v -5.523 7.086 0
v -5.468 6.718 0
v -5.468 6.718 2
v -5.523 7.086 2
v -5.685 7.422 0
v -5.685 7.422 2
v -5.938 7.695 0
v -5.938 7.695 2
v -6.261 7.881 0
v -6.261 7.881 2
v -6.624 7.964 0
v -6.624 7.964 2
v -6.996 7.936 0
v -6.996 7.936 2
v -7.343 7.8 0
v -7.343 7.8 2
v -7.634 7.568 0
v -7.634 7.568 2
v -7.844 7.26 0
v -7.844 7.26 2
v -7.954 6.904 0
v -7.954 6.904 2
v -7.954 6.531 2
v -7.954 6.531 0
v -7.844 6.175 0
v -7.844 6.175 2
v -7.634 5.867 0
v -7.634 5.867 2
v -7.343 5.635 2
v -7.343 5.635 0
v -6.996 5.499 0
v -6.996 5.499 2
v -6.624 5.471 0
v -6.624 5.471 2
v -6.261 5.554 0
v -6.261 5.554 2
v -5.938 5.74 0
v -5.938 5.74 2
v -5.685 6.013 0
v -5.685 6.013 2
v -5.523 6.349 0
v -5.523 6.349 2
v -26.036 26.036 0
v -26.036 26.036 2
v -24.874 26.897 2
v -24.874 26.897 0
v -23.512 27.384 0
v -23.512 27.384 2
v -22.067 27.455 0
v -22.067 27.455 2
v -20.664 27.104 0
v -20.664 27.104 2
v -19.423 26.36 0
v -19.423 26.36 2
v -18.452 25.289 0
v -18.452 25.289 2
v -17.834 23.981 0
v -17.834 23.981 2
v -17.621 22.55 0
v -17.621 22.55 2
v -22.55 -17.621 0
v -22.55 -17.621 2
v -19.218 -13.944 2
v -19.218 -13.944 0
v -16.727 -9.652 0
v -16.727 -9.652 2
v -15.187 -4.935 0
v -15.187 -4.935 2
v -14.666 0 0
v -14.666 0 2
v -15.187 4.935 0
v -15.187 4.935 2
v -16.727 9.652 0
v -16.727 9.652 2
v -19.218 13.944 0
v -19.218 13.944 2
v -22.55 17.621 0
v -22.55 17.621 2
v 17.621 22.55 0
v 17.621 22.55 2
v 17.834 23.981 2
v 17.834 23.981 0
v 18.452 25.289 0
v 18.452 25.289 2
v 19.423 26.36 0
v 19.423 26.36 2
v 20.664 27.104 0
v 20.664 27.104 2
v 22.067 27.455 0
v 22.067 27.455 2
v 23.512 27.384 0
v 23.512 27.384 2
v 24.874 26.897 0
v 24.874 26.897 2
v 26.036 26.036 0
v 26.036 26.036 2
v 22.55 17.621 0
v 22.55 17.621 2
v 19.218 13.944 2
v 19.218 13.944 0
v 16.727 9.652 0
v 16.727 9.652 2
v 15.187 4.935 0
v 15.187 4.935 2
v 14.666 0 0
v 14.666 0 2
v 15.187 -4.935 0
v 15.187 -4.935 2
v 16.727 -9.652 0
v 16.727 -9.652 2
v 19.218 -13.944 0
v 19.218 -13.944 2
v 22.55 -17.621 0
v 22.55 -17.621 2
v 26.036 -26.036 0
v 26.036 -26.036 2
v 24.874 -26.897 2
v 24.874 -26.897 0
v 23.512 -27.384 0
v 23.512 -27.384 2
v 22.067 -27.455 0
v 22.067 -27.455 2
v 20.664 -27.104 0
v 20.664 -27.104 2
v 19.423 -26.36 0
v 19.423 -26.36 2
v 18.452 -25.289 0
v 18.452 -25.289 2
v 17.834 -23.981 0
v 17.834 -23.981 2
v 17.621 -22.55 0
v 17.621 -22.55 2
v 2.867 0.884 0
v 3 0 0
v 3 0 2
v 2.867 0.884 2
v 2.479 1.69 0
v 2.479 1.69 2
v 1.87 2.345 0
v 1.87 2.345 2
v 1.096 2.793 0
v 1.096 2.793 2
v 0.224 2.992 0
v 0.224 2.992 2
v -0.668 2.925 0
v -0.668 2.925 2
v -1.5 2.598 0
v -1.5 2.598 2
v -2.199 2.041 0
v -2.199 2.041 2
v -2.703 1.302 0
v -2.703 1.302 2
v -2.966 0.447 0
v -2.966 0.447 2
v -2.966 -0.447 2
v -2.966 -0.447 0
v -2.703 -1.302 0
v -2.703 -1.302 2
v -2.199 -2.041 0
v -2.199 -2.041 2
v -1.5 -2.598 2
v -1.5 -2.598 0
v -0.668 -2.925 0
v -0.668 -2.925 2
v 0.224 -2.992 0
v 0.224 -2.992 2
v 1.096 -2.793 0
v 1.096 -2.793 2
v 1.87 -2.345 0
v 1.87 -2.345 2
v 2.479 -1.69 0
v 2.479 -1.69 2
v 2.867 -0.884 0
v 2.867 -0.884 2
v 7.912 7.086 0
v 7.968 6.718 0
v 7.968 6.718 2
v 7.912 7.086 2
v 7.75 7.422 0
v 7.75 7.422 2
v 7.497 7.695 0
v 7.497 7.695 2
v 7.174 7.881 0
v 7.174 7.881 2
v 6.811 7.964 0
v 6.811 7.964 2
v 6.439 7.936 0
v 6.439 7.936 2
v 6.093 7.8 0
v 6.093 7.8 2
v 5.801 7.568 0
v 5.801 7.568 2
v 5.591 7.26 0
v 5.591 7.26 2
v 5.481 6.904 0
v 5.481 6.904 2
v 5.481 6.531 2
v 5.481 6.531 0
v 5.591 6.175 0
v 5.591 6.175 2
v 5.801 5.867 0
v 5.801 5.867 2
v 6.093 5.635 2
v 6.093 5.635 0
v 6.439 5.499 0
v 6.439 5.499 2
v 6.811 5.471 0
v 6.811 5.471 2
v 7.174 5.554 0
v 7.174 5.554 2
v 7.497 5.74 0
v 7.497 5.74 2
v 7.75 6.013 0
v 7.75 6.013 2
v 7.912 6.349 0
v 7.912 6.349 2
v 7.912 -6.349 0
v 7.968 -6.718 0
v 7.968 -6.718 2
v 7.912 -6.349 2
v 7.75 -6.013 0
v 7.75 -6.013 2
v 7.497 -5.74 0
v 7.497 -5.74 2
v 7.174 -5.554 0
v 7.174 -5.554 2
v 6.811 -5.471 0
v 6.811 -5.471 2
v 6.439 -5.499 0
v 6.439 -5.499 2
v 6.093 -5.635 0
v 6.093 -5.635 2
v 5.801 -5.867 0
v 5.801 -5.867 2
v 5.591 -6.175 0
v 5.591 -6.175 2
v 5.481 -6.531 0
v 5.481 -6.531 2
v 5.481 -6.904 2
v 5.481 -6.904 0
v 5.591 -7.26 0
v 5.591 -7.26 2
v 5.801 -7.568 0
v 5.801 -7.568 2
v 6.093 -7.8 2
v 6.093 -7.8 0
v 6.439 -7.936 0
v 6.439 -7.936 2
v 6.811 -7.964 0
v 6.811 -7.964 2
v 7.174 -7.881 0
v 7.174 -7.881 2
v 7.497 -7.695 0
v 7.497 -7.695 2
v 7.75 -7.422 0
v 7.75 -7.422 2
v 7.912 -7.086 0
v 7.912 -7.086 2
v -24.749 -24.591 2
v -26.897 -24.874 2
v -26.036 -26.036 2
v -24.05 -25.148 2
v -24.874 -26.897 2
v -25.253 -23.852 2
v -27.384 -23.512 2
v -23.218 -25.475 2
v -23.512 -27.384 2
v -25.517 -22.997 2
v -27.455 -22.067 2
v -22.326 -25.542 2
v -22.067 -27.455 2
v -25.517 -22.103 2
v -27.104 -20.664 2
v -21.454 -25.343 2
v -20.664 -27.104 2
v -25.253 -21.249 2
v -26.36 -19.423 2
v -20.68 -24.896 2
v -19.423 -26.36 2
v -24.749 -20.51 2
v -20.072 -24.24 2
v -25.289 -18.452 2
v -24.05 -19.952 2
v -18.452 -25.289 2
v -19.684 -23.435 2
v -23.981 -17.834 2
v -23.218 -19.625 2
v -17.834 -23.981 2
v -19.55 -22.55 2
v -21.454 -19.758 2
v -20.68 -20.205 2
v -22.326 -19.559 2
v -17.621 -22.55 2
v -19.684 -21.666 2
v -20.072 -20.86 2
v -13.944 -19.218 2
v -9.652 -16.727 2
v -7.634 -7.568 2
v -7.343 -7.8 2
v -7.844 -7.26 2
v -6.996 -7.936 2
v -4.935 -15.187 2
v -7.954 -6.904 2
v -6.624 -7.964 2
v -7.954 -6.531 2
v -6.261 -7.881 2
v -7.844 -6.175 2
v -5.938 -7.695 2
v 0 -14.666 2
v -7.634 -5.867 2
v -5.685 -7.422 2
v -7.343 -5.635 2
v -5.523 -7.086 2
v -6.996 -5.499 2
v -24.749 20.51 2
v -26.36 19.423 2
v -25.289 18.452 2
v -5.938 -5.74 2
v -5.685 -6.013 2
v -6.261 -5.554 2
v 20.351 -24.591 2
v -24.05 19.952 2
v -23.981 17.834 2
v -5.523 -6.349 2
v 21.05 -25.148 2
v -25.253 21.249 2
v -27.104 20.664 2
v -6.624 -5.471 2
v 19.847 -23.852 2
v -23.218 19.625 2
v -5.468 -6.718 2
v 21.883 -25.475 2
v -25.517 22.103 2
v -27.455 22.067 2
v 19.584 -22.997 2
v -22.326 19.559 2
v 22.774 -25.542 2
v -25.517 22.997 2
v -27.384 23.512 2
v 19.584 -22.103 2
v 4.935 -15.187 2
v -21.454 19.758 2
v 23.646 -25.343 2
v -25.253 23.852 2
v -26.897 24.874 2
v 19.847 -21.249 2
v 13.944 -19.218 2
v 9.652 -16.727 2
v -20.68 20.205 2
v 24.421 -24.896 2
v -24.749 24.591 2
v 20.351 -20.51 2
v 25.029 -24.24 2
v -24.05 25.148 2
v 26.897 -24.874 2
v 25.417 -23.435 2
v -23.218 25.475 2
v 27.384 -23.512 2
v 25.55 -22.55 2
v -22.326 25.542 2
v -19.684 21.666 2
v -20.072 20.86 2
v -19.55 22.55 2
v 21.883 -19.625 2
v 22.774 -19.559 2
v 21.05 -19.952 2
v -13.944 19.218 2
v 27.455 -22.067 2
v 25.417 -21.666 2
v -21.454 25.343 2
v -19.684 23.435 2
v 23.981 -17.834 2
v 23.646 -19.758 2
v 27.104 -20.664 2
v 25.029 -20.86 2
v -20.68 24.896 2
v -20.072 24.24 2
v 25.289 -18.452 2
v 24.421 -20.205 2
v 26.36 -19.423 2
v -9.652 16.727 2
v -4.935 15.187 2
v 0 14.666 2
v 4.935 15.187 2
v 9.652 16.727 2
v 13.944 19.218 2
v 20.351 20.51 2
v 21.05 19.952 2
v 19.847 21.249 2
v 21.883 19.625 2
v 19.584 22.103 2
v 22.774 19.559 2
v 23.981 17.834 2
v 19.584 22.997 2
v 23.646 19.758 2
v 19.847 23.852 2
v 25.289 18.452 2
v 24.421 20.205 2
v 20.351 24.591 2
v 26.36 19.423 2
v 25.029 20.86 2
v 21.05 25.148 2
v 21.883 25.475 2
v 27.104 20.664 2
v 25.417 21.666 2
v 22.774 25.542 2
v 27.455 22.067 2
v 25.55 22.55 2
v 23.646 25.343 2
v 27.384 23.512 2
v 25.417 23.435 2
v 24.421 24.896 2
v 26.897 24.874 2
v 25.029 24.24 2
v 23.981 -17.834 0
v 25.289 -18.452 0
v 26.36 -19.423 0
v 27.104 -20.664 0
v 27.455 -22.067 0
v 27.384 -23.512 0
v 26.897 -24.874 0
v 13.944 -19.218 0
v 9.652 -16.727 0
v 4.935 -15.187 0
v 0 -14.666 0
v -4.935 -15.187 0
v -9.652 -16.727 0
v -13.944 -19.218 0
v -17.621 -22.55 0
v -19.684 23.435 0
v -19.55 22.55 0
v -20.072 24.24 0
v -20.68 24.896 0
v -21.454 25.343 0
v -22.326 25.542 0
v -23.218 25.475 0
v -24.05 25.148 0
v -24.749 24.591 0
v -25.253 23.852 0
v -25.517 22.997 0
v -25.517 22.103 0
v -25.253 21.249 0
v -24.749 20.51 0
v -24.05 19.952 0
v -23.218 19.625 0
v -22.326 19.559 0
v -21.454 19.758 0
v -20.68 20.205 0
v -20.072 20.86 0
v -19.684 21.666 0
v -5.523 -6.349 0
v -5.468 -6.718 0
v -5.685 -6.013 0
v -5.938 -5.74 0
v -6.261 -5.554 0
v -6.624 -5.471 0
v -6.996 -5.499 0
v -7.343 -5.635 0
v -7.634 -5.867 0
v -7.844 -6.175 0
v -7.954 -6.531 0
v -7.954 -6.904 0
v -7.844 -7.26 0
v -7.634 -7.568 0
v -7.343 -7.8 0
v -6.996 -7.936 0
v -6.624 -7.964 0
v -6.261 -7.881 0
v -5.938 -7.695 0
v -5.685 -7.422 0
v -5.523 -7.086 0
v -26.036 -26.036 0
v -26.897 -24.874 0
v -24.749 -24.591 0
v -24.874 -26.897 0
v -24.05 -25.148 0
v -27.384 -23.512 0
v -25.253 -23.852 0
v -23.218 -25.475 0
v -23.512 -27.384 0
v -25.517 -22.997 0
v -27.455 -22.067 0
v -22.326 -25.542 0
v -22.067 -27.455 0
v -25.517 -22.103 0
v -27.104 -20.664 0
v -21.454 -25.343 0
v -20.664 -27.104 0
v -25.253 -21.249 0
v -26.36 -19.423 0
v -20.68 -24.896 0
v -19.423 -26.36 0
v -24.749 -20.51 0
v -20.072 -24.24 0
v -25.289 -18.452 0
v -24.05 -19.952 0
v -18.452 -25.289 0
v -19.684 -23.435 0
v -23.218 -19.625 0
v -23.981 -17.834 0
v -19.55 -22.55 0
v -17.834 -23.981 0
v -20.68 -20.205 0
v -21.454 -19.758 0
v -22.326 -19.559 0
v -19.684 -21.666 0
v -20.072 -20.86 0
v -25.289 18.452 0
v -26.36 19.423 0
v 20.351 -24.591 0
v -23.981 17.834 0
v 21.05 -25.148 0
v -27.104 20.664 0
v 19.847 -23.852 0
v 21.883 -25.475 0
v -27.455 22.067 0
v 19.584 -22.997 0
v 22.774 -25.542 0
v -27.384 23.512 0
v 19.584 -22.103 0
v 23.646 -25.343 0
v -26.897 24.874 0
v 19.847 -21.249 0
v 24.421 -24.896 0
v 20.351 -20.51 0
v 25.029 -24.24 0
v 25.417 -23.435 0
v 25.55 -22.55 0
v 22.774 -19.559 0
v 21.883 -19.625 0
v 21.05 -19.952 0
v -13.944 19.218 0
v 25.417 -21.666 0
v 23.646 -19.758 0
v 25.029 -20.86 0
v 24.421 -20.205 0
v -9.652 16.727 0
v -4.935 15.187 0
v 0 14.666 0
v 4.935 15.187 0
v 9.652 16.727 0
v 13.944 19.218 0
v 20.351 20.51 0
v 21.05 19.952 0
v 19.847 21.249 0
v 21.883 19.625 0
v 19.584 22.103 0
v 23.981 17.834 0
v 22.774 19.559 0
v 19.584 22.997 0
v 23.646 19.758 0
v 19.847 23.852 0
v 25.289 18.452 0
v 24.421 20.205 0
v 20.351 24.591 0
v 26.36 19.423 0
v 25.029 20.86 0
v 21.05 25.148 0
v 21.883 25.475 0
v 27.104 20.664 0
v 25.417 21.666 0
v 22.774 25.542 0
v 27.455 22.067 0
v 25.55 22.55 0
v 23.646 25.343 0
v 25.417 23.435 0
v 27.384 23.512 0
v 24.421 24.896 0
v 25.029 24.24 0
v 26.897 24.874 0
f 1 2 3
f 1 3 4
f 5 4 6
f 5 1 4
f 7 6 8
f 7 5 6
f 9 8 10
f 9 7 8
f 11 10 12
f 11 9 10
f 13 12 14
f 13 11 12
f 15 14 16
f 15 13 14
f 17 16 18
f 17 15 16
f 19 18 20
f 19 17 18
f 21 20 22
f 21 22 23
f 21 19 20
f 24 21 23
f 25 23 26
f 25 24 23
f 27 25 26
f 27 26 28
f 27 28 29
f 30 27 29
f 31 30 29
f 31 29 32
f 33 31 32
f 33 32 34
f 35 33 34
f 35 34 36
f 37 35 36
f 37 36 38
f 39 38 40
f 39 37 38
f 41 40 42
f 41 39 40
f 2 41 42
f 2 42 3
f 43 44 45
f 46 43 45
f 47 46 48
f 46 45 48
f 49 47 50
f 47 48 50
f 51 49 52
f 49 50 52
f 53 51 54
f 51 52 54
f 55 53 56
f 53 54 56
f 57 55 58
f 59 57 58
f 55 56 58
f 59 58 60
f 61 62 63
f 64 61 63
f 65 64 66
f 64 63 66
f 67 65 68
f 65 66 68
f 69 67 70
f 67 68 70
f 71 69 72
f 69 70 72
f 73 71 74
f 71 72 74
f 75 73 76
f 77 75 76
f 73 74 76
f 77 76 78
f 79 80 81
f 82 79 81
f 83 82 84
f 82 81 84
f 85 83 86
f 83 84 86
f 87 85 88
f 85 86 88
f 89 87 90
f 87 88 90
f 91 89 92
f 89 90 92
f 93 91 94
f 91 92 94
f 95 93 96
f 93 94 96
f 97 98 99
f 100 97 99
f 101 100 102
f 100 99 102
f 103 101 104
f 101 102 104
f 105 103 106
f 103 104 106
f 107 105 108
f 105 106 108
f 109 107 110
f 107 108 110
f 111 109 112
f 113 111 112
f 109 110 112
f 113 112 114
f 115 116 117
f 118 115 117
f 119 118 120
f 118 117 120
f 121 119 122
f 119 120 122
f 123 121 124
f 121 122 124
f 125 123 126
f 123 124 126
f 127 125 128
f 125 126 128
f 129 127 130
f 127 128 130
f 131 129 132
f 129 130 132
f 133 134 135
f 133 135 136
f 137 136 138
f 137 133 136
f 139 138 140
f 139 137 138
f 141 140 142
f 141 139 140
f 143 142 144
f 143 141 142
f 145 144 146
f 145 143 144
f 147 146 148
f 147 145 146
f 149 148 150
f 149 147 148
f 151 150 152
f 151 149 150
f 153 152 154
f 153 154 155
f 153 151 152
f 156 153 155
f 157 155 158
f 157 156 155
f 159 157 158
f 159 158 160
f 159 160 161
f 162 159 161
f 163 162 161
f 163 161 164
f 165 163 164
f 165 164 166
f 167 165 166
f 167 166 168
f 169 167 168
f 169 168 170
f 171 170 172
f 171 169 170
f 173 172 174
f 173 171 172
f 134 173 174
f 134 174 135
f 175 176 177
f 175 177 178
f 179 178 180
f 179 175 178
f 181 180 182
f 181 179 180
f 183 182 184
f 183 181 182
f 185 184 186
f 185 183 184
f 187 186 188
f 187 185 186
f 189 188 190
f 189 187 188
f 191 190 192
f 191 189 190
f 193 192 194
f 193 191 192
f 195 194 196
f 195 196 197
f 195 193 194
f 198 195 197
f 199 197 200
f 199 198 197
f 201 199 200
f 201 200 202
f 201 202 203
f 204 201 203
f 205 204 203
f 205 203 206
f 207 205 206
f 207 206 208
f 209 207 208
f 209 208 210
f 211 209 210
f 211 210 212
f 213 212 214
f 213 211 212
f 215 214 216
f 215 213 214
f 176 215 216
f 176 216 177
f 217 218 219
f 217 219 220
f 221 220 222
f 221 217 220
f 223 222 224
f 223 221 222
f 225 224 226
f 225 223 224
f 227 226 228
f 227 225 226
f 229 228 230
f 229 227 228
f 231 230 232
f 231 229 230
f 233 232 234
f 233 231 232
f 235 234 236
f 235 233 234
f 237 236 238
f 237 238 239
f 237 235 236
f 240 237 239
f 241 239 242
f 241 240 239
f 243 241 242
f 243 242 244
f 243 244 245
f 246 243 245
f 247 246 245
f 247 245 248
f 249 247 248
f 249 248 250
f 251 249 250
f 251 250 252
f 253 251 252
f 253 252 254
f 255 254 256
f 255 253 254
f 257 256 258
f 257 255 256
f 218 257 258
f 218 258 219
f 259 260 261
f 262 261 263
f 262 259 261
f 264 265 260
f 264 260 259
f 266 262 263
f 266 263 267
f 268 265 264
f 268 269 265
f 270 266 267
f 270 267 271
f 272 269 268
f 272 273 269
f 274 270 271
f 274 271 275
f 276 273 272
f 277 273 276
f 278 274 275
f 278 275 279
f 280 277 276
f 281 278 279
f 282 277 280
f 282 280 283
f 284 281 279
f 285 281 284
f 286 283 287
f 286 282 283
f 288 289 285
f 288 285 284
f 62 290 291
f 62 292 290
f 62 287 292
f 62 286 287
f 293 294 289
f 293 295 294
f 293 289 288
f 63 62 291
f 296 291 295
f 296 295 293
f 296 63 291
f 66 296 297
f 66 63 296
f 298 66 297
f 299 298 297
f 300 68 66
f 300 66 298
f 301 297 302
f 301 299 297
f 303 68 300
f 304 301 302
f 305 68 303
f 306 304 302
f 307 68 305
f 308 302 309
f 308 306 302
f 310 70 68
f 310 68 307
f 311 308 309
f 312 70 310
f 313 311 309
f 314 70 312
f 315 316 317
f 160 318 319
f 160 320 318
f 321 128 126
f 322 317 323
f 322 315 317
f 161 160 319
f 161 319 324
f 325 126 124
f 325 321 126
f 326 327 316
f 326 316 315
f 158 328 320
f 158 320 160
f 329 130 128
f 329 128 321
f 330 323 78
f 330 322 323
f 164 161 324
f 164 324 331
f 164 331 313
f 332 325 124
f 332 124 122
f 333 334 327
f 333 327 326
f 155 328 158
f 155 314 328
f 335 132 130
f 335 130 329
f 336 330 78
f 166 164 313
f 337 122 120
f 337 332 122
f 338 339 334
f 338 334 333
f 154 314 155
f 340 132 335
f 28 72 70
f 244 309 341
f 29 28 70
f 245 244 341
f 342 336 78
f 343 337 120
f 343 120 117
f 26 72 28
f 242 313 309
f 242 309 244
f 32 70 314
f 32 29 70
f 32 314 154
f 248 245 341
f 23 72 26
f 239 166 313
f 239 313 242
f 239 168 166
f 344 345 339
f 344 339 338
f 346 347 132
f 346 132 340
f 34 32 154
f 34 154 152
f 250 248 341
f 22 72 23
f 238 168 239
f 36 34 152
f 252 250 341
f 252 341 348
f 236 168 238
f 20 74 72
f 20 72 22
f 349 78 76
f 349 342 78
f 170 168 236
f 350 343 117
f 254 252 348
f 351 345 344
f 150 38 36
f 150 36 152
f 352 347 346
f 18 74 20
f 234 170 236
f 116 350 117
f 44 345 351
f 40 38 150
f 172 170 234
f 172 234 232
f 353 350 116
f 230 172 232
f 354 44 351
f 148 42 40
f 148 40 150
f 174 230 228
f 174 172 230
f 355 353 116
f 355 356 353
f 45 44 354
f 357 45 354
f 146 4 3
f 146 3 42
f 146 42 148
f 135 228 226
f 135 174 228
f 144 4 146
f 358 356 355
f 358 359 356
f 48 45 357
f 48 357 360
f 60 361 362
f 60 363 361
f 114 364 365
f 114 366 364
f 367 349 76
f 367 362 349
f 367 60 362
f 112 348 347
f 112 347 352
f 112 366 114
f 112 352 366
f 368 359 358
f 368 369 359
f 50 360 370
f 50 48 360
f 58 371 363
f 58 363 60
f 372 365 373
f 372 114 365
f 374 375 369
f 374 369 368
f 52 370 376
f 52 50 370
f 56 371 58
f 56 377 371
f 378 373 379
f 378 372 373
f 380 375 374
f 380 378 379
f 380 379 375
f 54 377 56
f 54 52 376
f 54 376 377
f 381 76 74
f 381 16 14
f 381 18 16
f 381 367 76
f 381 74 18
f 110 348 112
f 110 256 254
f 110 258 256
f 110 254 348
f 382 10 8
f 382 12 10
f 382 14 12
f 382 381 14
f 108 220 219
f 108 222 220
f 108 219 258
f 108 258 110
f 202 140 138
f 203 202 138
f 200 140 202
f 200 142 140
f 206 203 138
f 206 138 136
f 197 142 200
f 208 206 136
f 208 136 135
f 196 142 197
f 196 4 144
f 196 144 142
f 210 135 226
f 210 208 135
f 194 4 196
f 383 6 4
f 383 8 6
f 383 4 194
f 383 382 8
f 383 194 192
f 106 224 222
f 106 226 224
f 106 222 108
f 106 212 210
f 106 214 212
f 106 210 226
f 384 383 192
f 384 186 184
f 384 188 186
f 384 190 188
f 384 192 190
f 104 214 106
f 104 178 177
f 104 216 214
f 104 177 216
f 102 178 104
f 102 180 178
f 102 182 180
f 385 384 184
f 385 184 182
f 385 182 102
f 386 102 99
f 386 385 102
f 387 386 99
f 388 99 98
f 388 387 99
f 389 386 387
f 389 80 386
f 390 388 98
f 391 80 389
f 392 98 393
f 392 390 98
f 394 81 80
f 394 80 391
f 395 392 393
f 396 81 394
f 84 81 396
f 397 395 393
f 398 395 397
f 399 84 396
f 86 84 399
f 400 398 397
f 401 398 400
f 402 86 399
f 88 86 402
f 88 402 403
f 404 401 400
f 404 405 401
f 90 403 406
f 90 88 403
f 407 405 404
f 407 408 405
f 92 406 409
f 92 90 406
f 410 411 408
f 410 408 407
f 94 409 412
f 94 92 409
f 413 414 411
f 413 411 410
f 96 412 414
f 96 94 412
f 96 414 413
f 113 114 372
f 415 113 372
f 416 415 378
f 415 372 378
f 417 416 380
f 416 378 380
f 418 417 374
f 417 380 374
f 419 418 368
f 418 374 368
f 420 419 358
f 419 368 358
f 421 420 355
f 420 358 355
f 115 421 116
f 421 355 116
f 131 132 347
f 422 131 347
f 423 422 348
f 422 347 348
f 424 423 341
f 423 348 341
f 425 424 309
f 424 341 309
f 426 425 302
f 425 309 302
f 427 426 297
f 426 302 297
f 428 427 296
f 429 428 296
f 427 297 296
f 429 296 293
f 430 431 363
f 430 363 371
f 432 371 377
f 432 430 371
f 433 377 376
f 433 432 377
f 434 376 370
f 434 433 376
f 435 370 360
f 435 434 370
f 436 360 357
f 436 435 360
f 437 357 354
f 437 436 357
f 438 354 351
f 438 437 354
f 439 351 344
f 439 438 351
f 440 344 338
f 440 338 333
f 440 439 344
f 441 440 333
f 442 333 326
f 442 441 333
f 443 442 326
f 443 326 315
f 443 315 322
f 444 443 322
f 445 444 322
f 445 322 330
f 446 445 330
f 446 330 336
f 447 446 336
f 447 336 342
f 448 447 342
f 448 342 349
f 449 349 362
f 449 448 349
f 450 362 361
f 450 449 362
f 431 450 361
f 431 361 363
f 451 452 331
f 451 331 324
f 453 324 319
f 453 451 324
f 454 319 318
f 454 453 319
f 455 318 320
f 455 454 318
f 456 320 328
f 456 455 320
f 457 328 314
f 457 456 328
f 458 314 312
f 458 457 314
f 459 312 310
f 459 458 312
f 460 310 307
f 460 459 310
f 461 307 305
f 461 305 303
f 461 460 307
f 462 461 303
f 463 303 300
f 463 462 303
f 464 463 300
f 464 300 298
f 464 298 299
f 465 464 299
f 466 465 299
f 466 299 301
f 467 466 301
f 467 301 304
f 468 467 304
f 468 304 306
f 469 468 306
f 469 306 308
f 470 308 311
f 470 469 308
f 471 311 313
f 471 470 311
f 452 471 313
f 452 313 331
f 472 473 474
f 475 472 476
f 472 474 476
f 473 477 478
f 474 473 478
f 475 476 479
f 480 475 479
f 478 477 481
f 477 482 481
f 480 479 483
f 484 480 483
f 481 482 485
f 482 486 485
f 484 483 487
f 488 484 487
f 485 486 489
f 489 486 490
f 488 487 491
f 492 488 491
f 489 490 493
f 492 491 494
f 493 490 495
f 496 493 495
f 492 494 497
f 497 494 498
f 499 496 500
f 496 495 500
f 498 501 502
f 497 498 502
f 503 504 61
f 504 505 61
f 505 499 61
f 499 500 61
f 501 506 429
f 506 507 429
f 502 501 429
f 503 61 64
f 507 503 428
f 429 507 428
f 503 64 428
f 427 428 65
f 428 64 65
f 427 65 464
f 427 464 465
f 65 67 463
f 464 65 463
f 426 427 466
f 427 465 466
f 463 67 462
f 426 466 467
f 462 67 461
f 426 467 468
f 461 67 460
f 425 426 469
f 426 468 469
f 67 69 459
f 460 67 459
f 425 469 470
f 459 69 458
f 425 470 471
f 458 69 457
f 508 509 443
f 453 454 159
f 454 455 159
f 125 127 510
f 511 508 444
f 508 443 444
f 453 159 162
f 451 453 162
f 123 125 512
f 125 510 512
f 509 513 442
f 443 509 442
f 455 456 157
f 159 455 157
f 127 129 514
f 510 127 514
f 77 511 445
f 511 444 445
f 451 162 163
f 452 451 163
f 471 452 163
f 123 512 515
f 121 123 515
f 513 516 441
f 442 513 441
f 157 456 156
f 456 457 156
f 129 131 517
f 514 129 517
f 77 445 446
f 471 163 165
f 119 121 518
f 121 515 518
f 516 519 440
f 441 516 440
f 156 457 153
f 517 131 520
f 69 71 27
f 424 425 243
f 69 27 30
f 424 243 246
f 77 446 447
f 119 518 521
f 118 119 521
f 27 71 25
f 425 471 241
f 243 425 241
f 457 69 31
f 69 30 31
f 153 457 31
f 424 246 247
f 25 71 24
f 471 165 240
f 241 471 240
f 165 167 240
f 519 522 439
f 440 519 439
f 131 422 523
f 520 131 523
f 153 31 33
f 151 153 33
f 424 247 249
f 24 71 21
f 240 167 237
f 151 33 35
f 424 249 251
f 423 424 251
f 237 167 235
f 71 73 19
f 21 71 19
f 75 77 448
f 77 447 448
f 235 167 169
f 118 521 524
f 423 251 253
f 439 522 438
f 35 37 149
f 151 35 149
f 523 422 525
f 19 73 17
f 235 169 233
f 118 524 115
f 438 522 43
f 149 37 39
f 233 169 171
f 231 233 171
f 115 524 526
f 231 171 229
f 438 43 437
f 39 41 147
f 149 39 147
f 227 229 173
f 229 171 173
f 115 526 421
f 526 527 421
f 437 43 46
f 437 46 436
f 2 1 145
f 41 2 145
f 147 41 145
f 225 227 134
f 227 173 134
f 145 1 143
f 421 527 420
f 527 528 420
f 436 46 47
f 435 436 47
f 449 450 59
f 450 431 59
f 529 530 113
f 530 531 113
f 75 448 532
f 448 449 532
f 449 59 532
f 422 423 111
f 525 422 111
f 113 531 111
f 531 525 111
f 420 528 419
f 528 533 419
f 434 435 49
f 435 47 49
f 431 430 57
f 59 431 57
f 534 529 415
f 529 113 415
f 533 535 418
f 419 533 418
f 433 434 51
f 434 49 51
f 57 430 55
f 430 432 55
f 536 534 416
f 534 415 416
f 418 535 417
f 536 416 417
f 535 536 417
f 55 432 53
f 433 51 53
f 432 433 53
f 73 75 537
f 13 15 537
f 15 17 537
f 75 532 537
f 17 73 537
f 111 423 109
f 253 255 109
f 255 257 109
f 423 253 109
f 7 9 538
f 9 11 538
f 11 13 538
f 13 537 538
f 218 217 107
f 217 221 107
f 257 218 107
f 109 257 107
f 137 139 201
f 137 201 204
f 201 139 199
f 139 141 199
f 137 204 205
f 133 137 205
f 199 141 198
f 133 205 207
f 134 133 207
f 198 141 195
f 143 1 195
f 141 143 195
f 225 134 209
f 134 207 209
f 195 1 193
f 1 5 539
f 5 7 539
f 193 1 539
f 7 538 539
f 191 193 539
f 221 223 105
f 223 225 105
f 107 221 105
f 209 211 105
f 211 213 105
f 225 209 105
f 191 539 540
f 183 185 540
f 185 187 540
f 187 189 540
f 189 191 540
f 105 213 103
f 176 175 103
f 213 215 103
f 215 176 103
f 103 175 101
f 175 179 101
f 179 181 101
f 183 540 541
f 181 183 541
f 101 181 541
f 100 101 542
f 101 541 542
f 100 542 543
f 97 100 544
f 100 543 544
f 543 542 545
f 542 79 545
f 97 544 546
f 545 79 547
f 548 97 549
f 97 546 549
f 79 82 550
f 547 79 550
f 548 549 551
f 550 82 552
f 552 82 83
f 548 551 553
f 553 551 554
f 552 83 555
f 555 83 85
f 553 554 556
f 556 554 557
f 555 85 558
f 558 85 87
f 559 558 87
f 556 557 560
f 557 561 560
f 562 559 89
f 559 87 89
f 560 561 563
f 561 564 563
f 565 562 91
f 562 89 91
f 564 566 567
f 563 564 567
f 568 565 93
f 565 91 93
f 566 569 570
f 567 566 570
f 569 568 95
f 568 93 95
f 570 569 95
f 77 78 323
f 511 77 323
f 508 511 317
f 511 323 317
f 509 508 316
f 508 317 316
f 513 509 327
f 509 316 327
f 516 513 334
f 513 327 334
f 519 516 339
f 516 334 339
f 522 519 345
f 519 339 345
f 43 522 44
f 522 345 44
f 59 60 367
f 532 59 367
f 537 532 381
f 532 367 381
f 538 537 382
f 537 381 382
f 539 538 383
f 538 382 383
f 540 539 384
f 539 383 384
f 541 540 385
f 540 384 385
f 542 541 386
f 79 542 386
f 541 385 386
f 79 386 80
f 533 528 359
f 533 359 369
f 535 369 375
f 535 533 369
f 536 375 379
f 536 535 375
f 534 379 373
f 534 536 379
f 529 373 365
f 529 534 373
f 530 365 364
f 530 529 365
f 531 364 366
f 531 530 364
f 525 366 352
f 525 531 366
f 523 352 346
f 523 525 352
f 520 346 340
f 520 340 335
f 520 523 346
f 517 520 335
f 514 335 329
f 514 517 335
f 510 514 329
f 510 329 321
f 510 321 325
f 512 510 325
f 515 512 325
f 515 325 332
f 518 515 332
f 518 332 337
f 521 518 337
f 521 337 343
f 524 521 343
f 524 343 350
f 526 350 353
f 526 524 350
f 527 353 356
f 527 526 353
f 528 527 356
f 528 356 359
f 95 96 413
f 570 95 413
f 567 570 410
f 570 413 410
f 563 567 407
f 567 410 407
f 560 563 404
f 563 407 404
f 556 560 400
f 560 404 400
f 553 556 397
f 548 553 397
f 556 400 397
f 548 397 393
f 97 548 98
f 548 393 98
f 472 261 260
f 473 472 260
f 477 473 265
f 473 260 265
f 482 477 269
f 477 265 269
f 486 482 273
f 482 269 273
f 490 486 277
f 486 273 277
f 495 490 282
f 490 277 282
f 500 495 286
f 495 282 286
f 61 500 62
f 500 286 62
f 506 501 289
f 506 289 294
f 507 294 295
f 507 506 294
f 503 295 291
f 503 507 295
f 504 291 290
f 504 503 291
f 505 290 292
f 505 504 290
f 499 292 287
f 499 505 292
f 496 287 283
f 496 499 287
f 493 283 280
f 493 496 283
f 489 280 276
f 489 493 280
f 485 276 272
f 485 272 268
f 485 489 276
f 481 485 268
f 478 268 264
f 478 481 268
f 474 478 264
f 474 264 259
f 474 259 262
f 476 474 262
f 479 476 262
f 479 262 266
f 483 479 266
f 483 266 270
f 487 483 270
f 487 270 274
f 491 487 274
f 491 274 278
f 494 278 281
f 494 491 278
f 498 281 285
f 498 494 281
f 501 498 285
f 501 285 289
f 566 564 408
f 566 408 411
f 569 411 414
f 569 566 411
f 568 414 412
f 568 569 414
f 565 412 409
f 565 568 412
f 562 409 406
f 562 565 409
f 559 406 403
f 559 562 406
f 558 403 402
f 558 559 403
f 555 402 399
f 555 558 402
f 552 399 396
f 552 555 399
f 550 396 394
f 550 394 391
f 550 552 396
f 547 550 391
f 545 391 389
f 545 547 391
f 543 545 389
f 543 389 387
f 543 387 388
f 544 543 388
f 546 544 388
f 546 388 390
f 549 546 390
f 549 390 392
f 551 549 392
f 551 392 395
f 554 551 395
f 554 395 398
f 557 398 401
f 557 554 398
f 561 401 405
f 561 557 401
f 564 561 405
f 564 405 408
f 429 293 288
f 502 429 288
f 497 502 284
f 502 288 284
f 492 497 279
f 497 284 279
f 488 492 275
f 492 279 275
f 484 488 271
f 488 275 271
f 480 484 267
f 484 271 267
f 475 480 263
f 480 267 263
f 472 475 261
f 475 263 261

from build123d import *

# Parameters (mm, degrees)
CROQUIS1_W              = 55
CROQUIS1_H              = 55
CROQUIS1_R              = 3
CROQUIS1_R_2            = 1.25
SALIENTE_EXTRUIR1_DEPTH = 2
REDONDEO1_R             = 5
CORTAR_EXTRUIR1_DEPTH   = 2


with BuildPart() as part:
    # Croquis1 → Saliente-Extruir1 (new body)
    with BuildSketch(Plane.XY):
        Rectangle(CROQUIS1_W, CROQUIS1_H)
        with Locations((-22.550252532, 22.550252532)):
            Circle(CROQUIS1_R, mode=Mode.SUBTRACT)
        with Locations((22.550252532, 22.550252532)):
            Circle(CROQUIS1_R, mode=Mode.SUBTRACT)
        with Locations((22.550252532, -22.550252532)):
            Circle(CROQUIS1_R, mode=Mode.SUBTRACT)
        with Locations((-22.550252532, -22.550252532)):
            Circle(CROQUIS1_R, mode=Mode.SUBTRACT)
        Circle(CROQUIS1_R, mode=Mode.SUBTRACT)
        with Locations((-6.717514421, 6.717514421)):
            Circle(CROQUIS1_R_2, mode=Mode.SUBTRACT)
        with Locations((6.717514421, 6.717514421)):
            Circle(CROQUIS1_R_2, mode=Mode.SUBTRACT)
        with Locations((6.717514421, -6.717514421)):
            Circle(CROQUIS1_R_2, mode=Mode.SUBTRACT)
        with Locations((-6.717514421, -6.717514421)):
            Circle(CROQUIS1_R_2, mode=Mode.SUBTRACT)
    extrude(amount=SALIENTE_EXTRUIR1_DEPTH)

    # Redondeo1
    redondeo1_edges = [part.edges().sort_by_distance(p)[0] for p in [
        (27.5, -27.5, 1),
        (-27.5, -27.5, 1),
        (-27.5, 27.5, 1),
        (27.5, 27.5, 1),
    ]]
    fillet(redondeo1_edges, radius=REDONDEO1_R)

    # Croquis2 → Cortar-Extruir1 (cut)
    with BuildSketch(Plane.XY.offset(2)):
        with BuildLine():
            ThreePointArc((-26.035533906, -26.035533906), (-27.103992097, -20.664031844), (-22.550252532, -17.621320344))
            ThreePointArc((-22.550252532, -17.621320344), (-14.66565297, 0), (-22.550252532, 17.621320344))
            ThreePointArc((-22.550252532, 17.621320344), (-27.103991999, 20.664031606), (-26.03553427, 26.035533542))
            ThreePointArc((-26.03553427, 26.035533542), (-27.119397761, 24.413416924), (-27.5, 22.5))
            Line((-27.5, 22.5), (-27.5, -22.5))
            ThreePointArc((-27.5, -22.5), (-27.119397663, -24.413417162), (-26.035533906, -26.035533906))
        make_face()
        with BuildLine():
            ThreePointArc((-22.5, 27.5), (-24.4134174, 27.119397564), (-26.03553427, 26.035533542))
            ThreePointArc((-26.03553427, 26.035533542), (-20.664032082, 27.103992196), (-17.621320344, 22.550252532))
            ThreePointArc((-17.621320344, 22.550252532), (0, 14.66565297), (17.621320344, 22.550252532))
            ThreePointArc((17.621320344, 22.550252532), (20.664031651, 27.103992018), (26.035533611, 26.035534201))
            ThreePointArc((26.035533611, 26.035534201), (24.413416969, 27.119397742), (22.5, 27.5))
            Line((22.5, 27.5), (-22.5, 27.5))
        make_face()
        with BuildLine():
            ThreePointArc((22.550252532, -17.621320344), (27.10399228, -20.664032285), (26.03553323, -26.035534581))
            ThreePointArc((26.03553323, -26.035534581), (27.11939748, -24.413417603), (27.5, -22.5))
            Line((27.5, -22.5), (27.5, 22.5))
            ThreePointArc((27.5, 22.5), (27.119397583, 24.413417354), (26.035533611, 26.035534201))
            ThreePointArc((26.035533611, 26.035534201), (27.103992177, 20.664032037), (22.550252532, 17.621320344))
            ThreePointArc((22.550252532, 17.621320344), (14.66565297, 0), (22.550252532, -17.621320344))
        make_face()
        with BuildLine():
            ThreePointArc((-17.621320344, -22.550252532), (-20.664031844, -27.103992097), (-26.035533906, -26.035533906))
            ThreePointArc((-26.035533906, -26.035533906), (-24.413417162, -27.119397663), (-22.5, -27.5))
            Line((-22.5, -27.5), (22.5, -27.5))
            ThreePointArc((22.5, -27.5), (24.413416721, -27.119397845), (26.03553323, -26.035534581))
            ThreePointArc((26.03553323, -26.035534581), (20.664031403, -27.103991915), (17.621320344, -22.550252532))
            ThreePointArc((17.621320344, -22.550252532), (0, -14.66565297), (-17.621320344, -22.550252532))
        make_face()
    extrude(amount=-CORTAR_EXTRUIR1_DEPTH, mode=Mode.SUBTRACT)


solid = part.part
